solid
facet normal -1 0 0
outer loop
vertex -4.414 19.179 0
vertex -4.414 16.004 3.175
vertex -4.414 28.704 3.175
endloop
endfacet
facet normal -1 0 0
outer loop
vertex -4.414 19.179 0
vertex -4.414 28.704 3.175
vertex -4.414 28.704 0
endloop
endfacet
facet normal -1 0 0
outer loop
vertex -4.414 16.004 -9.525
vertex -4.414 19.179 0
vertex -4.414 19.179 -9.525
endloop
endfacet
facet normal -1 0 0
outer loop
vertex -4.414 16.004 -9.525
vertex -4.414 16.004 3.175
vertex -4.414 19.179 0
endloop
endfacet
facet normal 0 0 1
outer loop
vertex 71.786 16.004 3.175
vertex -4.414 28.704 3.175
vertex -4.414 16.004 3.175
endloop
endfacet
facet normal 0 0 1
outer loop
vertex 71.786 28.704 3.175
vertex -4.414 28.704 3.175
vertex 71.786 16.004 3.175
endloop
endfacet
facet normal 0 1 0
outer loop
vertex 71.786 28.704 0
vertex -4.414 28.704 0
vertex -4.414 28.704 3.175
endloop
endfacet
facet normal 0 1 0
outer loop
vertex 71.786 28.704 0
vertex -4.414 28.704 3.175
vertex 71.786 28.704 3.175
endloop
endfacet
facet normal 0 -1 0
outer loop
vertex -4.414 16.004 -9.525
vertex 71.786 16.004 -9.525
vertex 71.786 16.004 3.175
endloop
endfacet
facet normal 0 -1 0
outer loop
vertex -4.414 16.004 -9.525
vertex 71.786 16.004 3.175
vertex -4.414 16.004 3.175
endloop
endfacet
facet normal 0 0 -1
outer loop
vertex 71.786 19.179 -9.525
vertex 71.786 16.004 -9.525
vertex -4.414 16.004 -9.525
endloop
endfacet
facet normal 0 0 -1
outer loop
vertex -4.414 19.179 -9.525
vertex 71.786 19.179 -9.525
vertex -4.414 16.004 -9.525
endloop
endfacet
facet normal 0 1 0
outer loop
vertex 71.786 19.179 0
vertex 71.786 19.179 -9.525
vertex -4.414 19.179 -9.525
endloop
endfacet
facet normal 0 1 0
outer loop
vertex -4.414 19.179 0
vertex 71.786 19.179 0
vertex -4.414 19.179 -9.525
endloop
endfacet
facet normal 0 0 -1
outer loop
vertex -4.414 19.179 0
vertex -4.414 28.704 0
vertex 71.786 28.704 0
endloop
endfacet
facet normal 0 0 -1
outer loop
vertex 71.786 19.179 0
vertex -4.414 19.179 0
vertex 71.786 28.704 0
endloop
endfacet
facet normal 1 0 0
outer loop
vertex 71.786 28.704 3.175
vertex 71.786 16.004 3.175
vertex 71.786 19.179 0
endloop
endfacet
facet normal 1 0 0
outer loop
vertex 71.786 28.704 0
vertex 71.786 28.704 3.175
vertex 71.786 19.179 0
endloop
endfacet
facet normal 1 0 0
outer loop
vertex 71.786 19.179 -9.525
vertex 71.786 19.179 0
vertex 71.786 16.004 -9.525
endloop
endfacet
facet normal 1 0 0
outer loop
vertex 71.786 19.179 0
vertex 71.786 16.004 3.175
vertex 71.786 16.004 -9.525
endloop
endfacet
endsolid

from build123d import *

# Parameters (mm, degrees)
SKETCH1_W           = 76.2
SKETCH1_H           = 12.7
BOSS_EXTRUDE1_DEPTH = 3.175
SKETCH7_W           = 76.2
SKETCH7_H           = 9.525
BOSS_EXTRUDE2_DEPTH = 3.175


with BuildPart() as part:
    # Sketch1 → Boss-Extrude1 (new body)
    with BuildSketch(Plane.XY):
        with Locations((33.686472643, 22.354273404)):
            Rectangle(SKETCH1_W, SKETCH1_H)
    extrude(amount=BOSS_EXTRUDE1_DEPTH)

    # Sketch7 → Boss-Extrude2 (add)
    with BuildSketch(Plane(origin=(0, 16.004273404, 0), x_dir=(-1, 0, 0), z_dir=(0, -1, 0))):
        with Locations((-33.686472643, 4.7625)):
            Rectangle(SKETCH7_W, SKETCH7_H)
    extrude(amount=-BOSS_EXTRUDE2_DEPTH)


solid = part.part
